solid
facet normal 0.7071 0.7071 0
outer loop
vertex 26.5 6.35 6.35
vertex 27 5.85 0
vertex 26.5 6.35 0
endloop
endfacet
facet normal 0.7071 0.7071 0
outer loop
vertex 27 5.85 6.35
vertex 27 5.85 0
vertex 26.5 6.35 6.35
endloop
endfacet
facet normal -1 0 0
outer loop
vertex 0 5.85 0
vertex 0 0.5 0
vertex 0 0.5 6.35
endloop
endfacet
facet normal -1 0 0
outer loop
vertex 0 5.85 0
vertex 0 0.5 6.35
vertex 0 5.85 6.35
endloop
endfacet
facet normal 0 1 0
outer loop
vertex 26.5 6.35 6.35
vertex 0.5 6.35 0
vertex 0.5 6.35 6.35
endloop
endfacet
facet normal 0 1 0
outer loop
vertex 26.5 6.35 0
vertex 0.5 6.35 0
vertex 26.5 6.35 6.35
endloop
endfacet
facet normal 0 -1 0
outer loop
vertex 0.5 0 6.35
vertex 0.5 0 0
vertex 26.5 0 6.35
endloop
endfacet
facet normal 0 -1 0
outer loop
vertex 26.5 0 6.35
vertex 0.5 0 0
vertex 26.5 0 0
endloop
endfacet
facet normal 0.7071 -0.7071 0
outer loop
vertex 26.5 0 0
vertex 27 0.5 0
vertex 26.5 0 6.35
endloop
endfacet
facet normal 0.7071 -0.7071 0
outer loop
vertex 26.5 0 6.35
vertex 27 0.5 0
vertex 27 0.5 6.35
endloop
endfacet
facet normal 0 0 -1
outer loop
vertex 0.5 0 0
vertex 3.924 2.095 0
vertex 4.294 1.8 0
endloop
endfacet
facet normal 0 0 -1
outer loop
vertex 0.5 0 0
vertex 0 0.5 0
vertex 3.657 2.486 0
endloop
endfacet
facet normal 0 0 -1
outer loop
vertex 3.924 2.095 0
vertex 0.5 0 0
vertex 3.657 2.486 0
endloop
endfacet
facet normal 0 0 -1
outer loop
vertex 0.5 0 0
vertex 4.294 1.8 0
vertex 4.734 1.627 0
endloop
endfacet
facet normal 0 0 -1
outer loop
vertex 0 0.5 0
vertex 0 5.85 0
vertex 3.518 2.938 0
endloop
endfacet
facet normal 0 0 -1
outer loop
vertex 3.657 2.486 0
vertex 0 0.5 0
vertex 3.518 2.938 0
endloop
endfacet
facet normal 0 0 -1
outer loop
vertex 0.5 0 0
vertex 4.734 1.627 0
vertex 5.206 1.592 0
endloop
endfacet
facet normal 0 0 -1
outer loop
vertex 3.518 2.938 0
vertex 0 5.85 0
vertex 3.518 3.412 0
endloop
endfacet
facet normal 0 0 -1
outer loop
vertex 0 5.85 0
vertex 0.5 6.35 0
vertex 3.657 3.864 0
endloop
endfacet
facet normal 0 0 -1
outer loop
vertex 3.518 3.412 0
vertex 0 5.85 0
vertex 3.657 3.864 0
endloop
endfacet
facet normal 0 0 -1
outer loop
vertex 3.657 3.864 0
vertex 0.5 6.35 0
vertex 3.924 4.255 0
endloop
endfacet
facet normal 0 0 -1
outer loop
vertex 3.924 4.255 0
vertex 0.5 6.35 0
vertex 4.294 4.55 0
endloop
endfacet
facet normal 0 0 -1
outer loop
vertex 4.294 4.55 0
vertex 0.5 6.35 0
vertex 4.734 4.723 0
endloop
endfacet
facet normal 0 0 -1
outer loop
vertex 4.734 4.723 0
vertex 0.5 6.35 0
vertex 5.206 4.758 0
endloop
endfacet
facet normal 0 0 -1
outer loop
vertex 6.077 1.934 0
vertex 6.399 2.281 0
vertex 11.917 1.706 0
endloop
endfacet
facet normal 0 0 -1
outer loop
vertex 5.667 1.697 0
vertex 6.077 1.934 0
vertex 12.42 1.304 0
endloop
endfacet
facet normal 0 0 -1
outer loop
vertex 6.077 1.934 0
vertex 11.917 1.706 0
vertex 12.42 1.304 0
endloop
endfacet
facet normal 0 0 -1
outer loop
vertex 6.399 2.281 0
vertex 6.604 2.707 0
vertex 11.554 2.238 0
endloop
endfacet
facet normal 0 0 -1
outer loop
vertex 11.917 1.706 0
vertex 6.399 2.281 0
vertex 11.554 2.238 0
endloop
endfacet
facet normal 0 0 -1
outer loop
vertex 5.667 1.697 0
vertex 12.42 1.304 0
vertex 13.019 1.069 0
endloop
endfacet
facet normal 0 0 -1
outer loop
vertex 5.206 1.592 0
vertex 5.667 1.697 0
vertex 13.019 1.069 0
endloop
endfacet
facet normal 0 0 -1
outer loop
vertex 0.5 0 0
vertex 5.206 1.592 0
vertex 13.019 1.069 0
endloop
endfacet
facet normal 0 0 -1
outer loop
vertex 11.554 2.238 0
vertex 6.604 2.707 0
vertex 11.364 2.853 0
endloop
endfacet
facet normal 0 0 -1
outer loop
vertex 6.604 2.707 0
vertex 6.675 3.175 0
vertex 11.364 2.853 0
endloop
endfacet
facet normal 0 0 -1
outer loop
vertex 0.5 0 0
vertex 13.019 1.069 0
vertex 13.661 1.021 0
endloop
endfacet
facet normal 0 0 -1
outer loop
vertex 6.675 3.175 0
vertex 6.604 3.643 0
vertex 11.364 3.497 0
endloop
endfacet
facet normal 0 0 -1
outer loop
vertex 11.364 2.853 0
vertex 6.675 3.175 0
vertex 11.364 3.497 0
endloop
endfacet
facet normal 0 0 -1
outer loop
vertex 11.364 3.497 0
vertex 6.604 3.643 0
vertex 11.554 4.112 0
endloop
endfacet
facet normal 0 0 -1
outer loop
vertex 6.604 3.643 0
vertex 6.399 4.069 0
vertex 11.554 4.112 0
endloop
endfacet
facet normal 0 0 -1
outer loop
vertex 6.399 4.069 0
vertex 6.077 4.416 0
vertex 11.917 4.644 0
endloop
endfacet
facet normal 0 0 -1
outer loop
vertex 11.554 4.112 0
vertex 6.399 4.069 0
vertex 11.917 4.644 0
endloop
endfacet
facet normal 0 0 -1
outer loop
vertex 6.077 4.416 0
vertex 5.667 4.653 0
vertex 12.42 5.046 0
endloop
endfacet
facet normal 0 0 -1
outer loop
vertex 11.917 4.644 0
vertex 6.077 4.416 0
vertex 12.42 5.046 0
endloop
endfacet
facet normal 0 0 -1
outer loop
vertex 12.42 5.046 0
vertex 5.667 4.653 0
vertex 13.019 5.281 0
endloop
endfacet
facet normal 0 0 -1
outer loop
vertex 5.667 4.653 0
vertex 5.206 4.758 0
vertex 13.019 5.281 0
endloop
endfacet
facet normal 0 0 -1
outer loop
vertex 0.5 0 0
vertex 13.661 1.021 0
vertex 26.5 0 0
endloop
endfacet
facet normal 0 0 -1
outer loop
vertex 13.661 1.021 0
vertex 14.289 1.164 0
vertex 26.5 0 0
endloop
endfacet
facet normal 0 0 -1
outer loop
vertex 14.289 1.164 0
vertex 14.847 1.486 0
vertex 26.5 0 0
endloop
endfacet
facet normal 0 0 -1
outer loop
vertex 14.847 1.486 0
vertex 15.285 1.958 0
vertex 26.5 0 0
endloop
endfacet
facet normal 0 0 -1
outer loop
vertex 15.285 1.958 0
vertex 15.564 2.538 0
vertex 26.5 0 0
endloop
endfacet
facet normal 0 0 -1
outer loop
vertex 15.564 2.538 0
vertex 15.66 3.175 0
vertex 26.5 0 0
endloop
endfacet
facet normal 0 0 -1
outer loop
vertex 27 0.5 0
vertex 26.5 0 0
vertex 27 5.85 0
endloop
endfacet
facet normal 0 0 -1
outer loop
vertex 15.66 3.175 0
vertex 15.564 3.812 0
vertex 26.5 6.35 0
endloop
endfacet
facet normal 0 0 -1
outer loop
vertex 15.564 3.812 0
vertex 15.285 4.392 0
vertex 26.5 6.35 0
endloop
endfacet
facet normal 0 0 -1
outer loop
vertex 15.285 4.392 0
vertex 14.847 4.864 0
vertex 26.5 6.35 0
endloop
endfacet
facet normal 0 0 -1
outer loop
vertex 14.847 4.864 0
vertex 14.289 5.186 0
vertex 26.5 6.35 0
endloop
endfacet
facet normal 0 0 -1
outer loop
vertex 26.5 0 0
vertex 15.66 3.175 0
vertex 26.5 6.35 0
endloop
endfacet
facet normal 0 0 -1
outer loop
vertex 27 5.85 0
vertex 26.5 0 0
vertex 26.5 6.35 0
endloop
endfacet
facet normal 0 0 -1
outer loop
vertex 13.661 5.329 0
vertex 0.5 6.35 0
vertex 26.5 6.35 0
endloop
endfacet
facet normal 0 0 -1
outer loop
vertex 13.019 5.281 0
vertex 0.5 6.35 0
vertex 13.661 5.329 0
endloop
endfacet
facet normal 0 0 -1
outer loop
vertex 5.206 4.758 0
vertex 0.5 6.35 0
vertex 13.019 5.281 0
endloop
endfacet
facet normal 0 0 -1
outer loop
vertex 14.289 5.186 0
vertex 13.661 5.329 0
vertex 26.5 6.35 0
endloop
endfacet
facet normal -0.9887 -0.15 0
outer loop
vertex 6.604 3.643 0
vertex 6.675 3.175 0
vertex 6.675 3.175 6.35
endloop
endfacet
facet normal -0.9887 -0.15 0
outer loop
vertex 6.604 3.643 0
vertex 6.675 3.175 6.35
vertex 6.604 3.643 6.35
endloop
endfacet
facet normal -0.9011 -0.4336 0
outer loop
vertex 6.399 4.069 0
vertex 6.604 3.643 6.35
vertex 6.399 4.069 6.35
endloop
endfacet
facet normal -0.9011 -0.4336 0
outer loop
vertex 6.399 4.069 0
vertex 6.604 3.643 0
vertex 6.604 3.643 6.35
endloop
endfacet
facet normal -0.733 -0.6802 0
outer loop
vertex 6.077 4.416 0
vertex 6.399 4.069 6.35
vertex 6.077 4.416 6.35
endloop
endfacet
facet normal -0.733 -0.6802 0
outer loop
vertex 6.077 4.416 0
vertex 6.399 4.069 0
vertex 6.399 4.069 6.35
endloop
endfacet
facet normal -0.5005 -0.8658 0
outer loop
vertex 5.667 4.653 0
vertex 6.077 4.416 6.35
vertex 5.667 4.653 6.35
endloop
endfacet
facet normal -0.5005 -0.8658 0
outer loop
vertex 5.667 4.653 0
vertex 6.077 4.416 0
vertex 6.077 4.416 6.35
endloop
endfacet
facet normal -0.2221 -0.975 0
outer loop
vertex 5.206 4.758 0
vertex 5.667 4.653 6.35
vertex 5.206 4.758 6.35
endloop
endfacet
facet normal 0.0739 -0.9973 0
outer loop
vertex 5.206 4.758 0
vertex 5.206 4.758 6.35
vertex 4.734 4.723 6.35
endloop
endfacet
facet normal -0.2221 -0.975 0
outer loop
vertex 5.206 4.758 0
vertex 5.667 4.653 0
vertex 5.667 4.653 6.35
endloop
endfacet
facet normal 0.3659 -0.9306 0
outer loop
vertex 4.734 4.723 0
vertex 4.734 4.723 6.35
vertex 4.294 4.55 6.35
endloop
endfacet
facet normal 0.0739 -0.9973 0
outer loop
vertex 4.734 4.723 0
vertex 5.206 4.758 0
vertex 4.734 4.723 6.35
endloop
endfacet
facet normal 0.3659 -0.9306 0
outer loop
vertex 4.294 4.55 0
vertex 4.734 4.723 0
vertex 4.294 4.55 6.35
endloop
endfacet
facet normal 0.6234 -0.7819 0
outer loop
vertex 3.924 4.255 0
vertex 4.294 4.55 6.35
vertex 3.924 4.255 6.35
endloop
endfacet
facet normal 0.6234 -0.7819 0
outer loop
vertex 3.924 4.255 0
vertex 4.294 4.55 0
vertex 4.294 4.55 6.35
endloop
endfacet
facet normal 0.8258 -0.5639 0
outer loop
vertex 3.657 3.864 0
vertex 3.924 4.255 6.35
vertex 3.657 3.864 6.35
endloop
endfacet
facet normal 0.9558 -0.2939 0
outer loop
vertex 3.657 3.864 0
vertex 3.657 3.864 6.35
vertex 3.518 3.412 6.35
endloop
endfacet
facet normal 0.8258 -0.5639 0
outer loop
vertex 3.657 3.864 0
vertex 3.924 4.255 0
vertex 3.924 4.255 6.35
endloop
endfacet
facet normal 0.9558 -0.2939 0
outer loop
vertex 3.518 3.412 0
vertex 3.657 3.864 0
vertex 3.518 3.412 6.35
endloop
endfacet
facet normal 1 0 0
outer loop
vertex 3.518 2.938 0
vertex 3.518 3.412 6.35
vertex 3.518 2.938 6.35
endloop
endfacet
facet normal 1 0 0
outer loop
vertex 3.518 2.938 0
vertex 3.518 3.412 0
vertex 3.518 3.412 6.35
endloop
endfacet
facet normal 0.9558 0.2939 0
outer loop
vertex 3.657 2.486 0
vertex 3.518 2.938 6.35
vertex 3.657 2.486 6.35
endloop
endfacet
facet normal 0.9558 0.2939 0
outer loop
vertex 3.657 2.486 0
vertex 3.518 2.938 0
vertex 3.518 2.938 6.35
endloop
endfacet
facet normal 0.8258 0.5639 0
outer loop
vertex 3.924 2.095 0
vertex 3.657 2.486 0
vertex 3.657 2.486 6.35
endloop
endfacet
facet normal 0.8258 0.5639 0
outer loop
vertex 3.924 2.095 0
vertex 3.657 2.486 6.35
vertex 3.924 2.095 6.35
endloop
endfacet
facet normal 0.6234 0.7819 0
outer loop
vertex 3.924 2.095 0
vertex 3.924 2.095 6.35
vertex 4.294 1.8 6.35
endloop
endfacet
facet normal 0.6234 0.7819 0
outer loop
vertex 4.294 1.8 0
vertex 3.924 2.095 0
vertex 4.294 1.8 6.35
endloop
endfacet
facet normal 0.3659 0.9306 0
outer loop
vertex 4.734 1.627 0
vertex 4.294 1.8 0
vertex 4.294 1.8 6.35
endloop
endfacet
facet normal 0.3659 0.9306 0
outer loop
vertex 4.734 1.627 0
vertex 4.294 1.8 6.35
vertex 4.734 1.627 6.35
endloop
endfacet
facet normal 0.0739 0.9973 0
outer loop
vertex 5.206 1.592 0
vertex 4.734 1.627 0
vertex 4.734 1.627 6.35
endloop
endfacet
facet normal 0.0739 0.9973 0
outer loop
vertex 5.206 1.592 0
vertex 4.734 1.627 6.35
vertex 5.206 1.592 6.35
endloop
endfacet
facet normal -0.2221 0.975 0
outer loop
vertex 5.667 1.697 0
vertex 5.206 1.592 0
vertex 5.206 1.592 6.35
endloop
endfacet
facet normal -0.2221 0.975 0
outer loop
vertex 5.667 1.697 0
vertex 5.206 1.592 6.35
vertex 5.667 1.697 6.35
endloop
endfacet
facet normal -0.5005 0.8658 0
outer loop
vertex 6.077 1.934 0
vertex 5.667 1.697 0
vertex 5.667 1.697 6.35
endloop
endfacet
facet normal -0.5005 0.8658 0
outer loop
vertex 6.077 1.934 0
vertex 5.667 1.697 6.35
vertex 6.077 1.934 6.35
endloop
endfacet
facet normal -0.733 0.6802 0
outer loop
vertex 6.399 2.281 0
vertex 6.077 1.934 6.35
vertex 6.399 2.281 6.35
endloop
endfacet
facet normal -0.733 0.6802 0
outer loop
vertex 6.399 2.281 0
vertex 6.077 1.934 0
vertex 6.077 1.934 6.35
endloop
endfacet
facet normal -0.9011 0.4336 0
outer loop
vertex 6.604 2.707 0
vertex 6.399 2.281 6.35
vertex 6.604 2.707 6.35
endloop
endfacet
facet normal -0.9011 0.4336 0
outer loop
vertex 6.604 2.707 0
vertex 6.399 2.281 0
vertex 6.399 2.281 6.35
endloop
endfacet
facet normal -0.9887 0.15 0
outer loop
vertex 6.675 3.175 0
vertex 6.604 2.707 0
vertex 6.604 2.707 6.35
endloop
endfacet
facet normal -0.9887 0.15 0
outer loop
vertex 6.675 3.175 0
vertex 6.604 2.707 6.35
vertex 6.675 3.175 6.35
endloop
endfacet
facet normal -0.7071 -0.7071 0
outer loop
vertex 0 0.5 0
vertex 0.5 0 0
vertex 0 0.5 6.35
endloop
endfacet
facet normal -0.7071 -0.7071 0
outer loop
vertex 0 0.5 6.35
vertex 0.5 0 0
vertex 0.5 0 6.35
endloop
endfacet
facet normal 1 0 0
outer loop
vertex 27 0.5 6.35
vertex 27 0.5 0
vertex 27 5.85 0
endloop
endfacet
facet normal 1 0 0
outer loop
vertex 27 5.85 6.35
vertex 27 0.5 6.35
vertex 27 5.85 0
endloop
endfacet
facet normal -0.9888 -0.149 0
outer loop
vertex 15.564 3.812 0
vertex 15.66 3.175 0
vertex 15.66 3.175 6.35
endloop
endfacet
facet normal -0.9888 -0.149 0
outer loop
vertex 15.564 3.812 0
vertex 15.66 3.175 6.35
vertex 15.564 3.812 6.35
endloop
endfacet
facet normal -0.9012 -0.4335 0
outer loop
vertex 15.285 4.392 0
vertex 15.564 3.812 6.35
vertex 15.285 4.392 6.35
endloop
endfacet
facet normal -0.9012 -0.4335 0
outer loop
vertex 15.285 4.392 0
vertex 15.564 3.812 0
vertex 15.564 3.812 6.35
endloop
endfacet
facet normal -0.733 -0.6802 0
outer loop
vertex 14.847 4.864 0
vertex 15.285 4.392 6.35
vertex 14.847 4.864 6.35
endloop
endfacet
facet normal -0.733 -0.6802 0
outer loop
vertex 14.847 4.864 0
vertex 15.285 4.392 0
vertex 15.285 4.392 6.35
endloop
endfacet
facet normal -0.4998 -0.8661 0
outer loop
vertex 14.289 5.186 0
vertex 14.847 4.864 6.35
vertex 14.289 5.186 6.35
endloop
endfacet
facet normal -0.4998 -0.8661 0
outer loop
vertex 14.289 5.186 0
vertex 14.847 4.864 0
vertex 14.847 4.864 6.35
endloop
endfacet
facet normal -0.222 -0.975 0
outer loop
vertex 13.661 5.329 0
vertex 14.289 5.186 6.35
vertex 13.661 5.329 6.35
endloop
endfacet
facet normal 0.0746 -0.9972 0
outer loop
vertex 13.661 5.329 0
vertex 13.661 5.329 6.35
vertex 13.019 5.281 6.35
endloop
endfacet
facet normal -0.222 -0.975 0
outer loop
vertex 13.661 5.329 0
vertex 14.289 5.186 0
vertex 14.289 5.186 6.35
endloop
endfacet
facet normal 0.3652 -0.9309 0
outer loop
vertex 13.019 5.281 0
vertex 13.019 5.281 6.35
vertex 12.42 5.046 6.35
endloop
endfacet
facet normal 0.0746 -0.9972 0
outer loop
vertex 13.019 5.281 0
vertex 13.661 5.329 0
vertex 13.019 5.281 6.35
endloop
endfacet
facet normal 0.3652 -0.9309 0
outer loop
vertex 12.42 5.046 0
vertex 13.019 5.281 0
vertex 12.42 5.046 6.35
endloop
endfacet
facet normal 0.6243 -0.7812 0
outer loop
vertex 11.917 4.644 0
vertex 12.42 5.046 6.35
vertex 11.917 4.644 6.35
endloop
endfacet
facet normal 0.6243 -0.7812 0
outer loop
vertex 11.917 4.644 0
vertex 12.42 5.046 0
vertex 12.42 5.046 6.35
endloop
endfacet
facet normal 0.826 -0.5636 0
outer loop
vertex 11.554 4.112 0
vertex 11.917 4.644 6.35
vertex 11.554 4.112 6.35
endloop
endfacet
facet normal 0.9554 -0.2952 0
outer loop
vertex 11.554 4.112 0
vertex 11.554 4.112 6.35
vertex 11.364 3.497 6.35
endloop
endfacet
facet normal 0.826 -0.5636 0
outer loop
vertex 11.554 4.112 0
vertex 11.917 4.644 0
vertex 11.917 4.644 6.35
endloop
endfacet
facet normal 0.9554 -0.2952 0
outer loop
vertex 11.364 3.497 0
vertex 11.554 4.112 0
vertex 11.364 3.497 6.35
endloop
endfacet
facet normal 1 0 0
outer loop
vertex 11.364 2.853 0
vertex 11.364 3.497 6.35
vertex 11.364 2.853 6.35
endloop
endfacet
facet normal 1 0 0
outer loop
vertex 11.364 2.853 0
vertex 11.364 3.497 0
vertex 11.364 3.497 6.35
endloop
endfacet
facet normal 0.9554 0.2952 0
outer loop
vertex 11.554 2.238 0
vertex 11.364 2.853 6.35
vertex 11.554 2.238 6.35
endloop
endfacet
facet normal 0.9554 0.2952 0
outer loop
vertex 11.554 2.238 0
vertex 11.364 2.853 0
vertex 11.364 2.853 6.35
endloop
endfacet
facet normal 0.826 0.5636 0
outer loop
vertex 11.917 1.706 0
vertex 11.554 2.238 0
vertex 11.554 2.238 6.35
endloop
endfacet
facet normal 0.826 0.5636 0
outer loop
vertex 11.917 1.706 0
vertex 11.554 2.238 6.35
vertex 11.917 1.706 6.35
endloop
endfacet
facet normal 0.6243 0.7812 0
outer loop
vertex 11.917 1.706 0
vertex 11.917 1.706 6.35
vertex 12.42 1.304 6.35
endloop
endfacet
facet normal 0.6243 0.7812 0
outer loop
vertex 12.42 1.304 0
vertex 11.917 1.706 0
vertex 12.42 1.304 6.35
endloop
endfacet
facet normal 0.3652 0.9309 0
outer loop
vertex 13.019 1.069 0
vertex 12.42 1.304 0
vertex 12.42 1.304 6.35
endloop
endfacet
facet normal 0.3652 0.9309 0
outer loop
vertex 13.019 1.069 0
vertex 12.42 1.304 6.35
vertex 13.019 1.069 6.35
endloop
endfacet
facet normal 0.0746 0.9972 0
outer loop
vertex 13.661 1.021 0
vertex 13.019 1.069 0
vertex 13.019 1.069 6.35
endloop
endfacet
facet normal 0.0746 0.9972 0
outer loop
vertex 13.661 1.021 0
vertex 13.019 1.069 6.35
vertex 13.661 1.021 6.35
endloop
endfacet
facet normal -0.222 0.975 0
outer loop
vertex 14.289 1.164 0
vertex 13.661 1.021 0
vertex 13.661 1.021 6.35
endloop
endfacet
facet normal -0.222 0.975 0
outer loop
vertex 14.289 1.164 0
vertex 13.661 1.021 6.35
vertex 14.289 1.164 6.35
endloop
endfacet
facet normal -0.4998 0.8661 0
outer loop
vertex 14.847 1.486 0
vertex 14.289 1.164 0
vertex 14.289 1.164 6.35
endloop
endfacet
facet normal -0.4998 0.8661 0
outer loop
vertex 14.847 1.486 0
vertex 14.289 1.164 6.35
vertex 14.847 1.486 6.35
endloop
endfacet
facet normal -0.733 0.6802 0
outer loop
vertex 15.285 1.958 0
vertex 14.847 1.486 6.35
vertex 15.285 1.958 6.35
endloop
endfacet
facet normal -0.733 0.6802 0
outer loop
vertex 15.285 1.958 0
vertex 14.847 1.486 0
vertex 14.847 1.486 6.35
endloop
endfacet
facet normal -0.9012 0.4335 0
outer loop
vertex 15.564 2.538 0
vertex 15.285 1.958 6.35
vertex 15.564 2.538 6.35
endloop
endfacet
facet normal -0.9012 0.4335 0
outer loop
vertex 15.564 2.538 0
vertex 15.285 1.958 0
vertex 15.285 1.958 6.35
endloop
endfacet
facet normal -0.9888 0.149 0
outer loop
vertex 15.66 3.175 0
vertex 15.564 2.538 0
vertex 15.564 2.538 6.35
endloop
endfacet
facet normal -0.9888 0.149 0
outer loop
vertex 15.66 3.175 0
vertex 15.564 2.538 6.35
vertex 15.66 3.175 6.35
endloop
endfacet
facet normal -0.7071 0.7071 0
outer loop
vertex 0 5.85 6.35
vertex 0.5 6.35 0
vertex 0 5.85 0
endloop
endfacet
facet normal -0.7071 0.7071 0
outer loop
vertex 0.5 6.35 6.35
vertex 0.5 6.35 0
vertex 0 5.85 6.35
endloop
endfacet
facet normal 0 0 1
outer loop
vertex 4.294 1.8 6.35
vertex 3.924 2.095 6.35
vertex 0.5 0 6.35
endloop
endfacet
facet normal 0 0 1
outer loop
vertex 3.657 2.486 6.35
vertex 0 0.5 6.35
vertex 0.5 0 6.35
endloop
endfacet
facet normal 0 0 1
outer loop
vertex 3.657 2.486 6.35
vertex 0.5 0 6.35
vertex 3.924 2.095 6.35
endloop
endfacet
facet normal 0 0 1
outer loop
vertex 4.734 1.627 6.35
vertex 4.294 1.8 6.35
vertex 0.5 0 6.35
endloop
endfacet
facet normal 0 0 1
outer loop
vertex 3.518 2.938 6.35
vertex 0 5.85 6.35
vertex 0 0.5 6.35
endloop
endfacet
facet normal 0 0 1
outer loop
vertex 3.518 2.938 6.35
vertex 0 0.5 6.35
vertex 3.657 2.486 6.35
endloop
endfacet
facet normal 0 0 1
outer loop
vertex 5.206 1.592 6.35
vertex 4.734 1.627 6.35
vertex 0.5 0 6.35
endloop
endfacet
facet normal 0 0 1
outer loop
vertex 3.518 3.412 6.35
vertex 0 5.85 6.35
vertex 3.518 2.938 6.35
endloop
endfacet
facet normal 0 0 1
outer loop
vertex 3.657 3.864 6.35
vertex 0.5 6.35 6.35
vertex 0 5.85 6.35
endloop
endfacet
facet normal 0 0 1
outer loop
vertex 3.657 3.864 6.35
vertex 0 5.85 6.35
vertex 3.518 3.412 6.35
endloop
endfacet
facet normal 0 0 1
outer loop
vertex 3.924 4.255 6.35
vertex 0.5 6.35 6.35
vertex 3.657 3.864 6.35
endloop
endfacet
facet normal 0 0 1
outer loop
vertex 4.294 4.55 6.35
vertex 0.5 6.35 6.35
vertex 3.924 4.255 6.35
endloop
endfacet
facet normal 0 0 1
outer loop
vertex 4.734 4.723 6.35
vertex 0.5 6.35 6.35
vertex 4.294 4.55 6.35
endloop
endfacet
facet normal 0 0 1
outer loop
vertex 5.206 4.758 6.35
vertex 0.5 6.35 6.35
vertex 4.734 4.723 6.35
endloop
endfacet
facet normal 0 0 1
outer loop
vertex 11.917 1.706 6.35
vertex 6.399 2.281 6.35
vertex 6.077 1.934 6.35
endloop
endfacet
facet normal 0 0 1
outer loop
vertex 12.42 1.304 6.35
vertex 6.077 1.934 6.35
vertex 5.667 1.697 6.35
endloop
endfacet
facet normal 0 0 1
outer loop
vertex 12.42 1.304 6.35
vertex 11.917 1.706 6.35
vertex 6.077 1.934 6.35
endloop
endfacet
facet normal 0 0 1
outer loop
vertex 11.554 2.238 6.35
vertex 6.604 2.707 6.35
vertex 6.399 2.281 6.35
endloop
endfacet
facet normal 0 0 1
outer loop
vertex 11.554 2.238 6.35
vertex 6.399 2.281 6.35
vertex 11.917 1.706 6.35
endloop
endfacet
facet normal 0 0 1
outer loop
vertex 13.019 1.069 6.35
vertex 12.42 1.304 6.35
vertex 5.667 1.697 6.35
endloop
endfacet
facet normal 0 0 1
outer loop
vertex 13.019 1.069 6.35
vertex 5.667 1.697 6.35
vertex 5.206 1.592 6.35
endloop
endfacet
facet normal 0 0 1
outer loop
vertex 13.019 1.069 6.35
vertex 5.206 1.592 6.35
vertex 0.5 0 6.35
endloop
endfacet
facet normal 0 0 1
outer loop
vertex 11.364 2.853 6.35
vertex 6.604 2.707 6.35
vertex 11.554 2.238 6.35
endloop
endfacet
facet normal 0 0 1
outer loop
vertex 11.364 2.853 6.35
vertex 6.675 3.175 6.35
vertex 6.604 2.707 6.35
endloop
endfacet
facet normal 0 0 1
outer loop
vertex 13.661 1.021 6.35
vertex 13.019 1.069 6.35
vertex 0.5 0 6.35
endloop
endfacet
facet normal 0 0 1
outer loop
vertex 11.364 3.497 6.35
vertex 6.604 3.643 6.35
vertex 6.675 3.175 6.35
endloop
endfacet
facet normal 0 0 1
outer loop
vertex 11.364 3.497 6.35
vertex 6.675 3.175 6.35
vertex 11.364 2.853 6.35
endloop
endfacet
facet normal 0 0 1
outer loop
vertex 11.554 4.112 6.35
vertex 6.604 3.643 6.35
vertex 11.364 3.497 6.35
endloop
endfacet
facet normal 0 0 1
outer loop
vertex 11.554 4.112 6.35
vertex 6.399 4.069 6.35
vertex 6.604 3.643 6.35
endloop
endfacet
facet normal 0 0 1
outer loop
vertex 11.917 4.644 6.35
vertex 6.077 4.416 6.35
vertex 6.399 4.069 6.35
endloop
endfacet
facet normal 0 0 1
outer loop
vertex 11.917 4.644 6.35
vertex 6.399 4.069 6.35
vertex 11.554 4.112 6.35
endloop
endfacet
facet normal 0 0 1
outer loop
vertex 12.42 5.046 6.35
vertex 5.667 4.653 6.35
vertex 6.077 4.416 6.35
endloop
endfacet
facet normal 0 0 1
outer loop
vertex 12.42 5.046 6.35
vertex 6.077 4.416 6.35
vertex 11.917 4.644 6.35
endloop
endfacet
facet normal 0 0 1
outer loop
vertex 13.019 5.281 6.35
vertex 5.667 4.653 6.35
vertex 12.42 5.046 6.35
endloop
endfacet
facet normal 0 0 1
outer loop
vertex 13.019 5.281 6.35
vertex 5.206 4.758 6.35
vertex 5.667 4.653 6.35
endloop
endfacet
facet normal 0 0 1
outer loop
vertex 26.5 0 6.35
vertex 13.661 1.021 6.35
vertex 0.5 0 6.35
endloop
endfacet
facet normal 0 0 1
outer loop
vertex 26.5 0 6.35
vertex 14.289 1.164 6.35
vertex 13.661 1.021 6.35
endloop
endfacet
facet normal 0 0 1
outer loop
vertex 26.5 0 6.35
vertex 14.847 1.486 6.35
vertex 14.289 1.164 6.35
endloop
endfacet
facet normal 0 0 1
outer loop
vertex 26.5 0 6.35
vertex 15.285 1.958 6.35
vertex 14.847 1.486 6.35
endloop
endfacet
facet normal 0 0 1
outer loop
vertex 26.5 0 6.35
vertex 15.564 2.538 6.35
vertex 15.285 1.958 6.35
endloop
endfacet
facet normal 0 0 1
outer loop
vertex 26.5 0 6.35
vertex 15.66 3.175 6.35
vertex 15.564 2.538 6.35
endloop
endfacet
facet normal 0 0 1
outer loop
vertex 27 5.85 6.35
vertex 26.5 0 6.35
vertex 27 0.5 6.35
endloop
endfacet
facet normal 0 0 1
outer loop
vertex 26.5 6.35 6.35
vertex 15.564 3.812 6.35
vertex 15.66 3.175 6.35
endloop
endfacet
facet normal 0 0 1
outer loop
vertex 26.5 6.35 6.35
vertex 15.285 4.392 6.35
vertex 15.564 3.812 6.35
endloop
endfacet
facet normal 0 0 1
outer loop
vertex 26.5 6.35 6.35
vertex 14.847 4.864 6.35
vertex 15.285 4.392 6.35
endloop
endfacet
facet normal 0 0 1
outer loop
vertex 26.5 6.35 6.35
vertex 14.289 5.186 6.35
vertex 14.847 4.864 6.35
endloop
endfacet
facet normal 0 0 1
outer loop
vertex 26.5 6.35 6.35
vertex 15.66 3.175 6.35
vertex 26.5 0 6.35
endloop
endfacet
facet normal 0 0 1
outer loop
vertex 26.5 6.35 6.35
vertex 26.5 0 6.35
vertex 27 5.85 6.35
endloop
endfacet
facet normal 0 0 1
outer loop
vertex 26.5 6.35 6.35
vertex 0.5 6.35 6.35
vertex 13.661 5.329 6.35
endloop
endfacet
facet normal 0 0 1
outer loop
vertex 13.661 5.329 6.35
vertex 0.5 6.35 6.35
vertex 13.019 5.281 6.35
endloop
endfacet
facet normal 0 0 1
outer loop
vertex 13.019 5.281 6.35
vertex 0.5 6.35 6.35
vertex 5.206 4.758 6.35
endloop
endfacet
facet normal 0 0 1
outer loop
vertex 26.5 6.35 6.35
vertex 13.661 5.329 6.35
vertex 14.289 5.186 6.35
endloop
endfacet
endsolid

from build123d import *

# Parameters (mm, degrees)
SKETCH1_W           = 27
SKETCH1_H           = 6.35
SKETCH1_R           = 2.16
SKETCH1_R_2         = 1.5875
BOSS_EXTRUDE1_DEPTH = 6.35
CHAMFER1_SIZE       = 0.5


with BuildPart() as part:
    # Sketch1 → Boss-Extrude1 (new body)
    with BuildSketch(Plane.XY):
        with Locations((13.5, 3.175)):
            Rectangle(SKETCH1_W, SKETCH1_H)
        with Locations((13.5, 3.175)):
            Circle(SKETCH1_R, mode=Mode.SUBTRACT)
        with Locations((5.0875, 3.175)):
            Circle(SKETCH1_R_2, mode=Mode.SUBTRACT)
    extrude(amount=BOSS_EXTRUDE1_DEPTH)

    # Chamfer1
    chamfer1_edges = [part.edges().sort_by_distance(p)[0] for p in [
        (0, 6.35, 3.175),
        (27, 6.35, 3.175),
        (27, 0, 3.175),
        (0, 0, 3.175),
    ]]
    chamfer(chamfer1_edges, length=CHAMFER1_SIZE)


solid = part.part
